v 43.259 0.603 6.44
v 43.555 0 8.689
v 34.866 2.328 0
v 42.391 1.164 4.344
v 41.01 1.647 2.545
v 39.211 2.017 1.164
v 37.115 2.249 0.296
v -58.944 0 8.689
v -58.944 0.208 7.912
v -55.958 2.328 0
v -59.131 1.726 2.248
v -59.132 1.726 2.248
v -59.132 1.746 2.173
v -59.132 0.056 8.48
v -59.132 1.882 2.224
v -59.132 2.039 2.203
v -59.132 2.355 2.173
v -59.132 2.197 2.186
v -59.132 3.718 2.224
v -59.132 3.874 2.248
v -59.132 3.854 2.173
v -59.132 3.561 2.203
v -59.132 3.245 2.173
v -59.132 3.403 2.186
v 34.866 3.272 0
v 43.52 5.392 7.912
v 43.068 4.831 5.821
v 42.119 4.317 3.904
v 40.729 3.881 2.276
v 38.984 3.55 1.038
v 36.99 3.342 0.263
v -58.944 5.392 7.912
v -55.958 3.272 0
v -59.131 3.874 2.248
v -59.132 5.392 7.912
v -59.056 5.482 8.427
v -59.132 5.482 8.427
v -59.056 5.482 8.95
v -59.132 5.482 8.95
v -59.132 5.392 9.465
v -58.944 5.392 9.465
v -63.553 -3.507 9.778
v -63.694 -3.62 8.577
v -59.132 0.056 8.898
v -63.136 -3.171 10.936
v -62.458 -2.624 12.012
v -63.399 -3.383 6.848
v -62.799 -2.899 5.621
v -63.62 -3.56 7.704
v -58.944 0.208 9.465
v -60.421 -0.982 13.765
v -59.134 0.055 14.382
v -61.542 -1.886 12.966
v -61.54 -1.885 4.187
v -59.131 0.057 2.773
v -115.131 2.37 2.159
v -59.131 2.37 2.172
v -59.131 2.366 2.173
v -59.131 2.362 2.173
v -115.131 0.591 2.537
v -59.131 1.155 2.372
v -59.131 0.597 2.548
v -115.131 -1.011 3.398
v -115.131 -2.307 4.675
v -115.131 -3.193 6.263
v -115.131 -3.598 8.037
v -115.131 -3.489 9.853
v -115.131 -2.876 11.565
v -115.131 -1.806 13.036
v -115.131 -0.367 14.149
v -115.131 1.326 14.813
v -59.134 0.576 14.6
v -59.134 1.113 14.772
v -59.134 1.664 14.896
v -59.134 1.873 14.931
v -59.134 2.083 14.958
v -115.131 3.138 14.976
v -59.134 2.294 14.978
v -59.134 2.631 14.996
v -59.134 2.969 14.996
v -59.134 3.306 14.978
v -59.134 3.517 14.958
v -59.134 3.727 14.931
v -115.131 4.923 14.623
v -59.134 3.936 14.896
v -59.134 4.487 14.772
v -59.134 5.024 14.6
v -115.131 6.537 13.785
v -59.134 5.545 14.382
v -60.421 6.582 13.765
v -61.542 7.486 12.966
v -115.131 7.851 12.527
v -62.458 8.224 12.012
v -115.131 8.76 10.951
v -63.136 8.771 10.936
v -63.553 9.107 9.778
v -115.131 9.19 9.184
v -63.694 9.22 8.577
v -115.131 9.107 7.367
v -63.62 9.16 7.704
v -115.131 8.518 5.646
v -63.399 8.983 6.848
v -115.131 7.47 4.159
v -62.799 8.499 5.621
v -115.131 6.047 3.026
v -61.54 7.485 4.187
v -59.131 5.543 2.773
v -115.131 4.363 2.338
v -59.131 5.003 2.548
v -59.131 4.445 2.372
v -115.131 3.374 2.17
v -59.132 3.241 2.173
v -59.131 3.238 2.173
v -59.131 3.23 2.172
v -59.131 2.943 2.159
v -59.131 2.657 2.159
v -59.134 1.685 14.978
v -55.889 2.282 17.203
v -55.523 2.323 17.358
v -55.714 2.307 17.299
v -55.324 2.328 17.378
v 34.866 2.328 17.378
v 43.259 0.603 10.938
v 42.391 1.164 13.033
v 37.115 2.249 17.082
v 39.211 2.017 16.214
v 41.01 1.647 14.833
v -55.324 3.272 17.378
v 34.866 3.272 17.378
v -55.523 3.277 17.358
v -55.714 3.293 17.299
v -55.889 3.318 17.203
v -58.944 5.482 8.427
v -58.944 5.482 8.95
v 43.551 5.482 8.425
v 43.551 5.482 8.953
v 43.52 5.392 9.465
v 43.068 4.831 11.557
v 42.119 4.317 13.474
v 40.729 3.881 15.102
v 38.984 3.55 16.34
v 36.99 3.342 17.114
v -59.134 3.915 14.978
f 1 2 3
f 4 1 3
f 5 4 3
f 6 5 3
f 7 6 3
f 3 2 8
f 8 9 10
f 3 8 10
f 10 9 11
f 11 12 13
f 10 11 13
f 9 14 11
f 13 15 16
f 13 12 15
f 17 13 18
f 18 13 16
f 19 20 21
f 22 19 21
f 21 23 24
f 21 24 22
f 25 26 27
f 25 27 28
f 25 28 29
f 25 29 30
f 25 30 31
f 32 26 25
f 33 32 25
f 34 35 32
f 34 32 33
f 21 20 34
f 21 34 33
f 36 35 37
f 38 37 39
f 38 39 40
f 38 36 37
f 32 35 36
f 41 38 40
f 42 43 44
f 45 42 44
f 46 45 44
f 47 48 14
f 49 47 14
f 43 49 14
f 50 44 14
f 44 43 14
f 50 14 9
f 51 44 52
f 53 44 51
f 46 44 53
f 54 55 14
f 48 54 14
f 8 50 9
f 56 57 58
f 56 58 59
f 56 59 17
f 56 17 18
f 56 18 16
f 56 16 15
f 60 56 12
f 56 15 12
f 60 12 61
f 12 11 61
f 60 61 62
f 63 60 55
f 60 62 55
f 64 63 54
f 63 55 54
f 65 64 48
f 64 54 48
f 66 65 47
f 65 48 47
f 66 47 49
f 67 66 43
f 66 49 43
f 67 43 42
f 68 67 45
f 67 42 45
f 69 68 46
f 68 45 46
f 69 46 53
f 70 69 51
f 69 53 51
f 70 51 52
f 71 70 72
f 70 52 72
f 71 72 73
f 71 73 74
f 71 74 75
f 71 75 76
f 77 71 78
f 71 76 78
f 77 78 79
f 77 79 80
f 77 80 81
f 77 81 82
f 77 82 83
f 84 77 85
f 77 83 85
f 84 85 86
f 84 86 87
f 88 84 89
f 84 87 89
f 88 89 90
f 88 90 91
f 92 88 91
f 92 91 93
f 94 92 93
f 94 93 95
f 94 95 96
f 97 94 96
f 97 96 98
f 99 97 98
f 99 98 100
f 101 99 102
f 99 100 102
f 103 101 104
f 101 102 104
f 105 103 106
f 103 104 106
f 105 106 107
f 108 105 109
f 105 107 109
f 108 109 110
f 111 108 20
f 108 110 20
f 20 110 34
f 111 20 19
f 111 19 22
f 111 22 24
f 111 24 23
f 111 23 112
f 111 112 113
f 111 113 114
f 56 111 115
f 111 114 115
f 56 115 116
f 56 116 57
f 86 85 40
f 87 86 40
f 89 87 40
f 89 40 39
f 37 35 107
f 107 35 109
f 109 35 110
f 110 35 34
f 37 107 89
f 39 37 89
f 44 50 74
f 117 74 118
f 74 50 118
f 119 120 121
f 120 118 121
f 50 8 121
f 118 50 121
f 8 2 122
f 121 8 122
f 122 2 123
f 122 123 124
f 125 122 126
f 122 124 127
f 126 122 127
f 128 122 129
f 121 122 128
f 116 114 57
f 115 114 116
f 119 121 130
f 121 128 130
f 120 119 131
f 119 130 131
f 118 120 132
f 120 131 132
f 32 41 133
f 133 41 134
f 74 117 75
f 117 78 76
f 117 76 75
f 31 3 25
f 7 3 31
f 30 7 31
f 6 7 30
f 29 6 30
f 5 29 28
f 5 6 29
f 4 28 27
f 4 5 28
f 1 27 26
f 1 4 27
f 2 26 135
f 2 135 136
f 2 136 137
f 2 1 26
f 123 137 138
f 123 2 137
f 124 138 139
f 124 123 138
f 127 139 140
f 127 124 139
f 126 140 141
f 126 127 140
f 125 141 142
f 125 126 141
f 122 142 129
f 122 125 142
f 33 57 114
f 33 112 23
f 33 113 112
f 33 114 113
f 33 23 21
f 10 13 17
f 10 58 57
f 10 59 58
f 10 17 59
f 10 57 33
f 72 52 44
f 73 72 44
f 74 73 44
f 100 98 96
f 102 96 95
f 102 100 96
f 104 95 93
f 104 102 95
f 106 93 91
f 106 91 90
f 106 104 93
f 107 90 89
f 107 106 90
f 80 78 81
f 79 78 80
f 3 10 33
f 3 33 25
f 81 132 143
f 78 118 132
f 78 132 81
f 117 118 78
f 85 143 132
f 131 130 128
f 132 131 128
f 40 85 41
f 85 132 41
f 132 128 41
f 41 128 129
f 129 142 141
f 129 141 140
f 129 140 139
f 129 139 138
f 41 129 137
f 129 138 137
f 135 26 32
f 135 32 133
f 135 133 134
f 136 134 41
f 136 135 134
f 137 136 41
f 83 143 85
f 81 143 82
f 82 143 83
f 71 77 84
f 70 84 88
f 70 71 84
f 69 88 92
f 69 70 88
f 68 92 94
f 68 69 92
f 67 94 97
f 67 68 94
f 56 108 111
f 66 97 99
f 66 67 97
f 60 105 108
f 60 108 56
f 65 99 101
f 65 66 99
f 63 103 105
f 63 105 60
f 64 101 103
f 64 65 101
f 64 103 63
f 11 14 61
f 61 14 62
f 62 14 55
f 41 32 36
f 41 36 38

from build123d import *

# Parameters (mm, degrees)
BOSS_EXTRUDE2_DEPTH      = 5.6
CHAMFER2_SIZE            = 2.328478482
CHAMFER2_SIZE_2          = 8.69
CHAMFER3_SIZE            = 8.69
CHAMFER3_SIZE_2          = 2.328478482
CHAMFER4_SIZE            = 8.69
CHAMFER4_SIZE_2          = 2.328478482
CHAMFER5_SIZE            = 8.69
CHAMFER5_SIZE_2          = 2.328478482
FILLET1_R                = 1
SKETCH8_R                = 6.42
BOSS_EXTRUDE3_DEPTH      = 58
FILLET2_R                = 3
CUT_EXTRUDE12_DEPTH      = 16
CUT_EXTRUDE13_DEPTH      = 119.774223563
CUT_EXTRUDE13_DEPTH_BACK = 119.774223563
SKETCH19_W               = 4.551969905
SKETCH19_H               = 31.016999287


with BuildPart() as part:
    # Sketch3 → Boss-Extrude2 (new body)
    with BuildSketch(Plane(origin=(0, 0, 0), x_dir=(1, 0, 0), z_dir=(0, 1, 0))):
        with BuildLine():
            Line((-55.958218902, 0), (34.866239796, 0))
            ThreePointArc((34.866239796, 0), (43.555159042, -8.688919246), (34.866239796, -17.377838493))
            Line((34.866239796, -17.377838493), (-55.633760204, -17.377838493))
            Line((-55.633760204, -17.377838493), (-59.133760204, -14.977838493))
            Line((-59.133760204, -14.977838493), (-59.132241437, -8.577838493))
            Line((-59.132241437, -8.577838493), (-59.132241437, -2.173298587))
            Line((-59.132241437, -2.173298587), (-55.958218902, 0))
        make_face()
    extrude(amount=BOSS_EXTRUDE2_DEPTH)

    # Chamfer2
    # the kernel refuses this chamfer: 8.69, 2.328478482 mm, written as the material it takes off along each edge
    with BuildSketch(Plane(origin=(57.431750241, 5.6, 17.377838493), x_dir=(0, -0.9905000388259545, 0.13751244702128881), z_dir=(-1, 0, 0))) as chamfer2_piece_1:
        Polygon((CHAMFER2_SIZE * 0.990500038922, -CHAMFER2_SIZE * 0.137512447035), (-CHAMFER2_SIZE_2 * 0.137512447021, -CHAMFER2_SIZE_2 * 0.990500038826), (0, 0), align=None)
    extrude(amount=135.63102089, mode=Mode.SUBTRACT)

    # Chamfer3
    # the kernel refuses this chamfer: 8.69, 2.328478482 mm, written as the material it takes off along each edge
    with BuildSketch(Plane(origin=(57.431750241, 0, 17.377838493), x_dir=(0, -0.009967146577156423, -0.9999503267608394), z_dir=(-1, 0, 0))) as chamfer3_piece_1:
        Polygon((CHAMFER3_SIZE * 0.999950326761, -CHAMFER3_SIZE * 0.00996714657716), (-CHAMFER3_SIZE_2 * 0.00996714657813, -CHAMFER3_SIZE_2 * 0.999950326858), (0, 0), align=None)
    extrude(amount=135.63102089, mode=Mode.SUBTRACT)

    # Chamfer4
    # the kernel refuses this chamfer: 8.69, 2.328478482 mm, written as the material it takes off along each edge
    with BuildSketch(Plane(origin=(-78.523729347, 5.6, 0), x_dir=(0, 0.00996714657715643, 0.9999503267608394), z_dir=(1, 0, 0))) as chamfer4_piece_1:
        Polygon((CHAMFER4_SIZE * 0.999950326761, CHAMFER4_SIZE * 0.00996714657716), (-CHAMFER4_SIZE_2 * 0.00996714657813, CHAMFER4_SIZE_2 * 0.999950326858), (0, 0), align=None)
    extrude(amount=135.955479588, mode=Mode.SUBTRACT)

    # Chamfer5
    # the kernel refuses this chamfer: 8.69, 2.328478482 mm, written as the material it takes off along each edge
    with BuildSketch(Plane(origin=(-78.523729347, 0, 0), x_dir=(0, -0.009967146577156423, 0.9999503267608394), z_dir=(1, 0, 0))) as chamfer5_piece_1:
        Polygon((CHAMFER5_SIZE * 0.999950326761, -CHAMFER5_SIZE * 0.00996714657716), (-CHAMFER5_SIZE_2 * 0.00996714657813, -CHAMFER5_SIZE_2 * 0.999950326858), (0, 0), align=None)
    extrude(amount=135.955479588, mode=Mode.SUBTRACT)

    # Fillet1
    fillet1_edges = [part.edges().sort_by_distance(p)[0] for p in [
        (-55.633760204, 2.8, 17.377838493),
    ]]
    fillet(fillet1_edges, radius=FILLET1_R)

    # Sketch8 → Boss-Extrude3 (add)
    with BuildSketch(Plane(origin=(-59.130202523, 0, -0.014032034), x_dir=(-0.00023730738394525297, 0, 0.9999999718426024), z_dir=(-0.9999999718426024, 0, -0.00023730738394525297))):
        with Locations(Location((8.591870769, 2.8, 0), (0, 0, 183.840787638))):
            Circle(SKETCH8_R)
    extrude(amount=BOSS_EXTRUDE3_DEPTH)

    # Fillet2
    fillet2_edges = [part.edges().sort_by_distance(p)[0] for p in [
        (-7.788554378, 5.599710413, 8.688919246),
    ]]
    fillet(fillet2_edges, radius=FILLET2_R)

    # Sketch16 → Cut-Extrude12 (cut)
    with BuildSketch(Plane.XY):
        Polygon((-58.943650552, 9.22), (-63.693726721, 9.22), (-58.943650552, 5.391659351), align=None)
        Polygon((-58.943650552, -3.62), (-63.693726721, -3.62), (-58.943650552, 0.208340649), align=None)
    extrude(amount=CUT_EXTRUDE12_DEPTH, mode=Mode.SUBTRACT)

    # Sketch19 → Cut-Extrude13 (cut, two sides: drawn at the far end of the back side and taken through both)
    with BuildSketch(Plane(origin=(0, 0, 0), x_dir=(1, 0, 0), z_dir=(0, 1, 0)).offset(-CUT_EXTRUDE13_DEPTH_BACK)):
        with Locations((-117.406701244, -5.968129835)):
            Rectangle(SKETCH19_W, SKETCH19_H)
    extrude(amount=CUT_EXTRUDE13_DEPTH + CUT_EXTRUDE13_DEPTH_BACK, mode=Mode.SUBTRACT)


solid = part.part
